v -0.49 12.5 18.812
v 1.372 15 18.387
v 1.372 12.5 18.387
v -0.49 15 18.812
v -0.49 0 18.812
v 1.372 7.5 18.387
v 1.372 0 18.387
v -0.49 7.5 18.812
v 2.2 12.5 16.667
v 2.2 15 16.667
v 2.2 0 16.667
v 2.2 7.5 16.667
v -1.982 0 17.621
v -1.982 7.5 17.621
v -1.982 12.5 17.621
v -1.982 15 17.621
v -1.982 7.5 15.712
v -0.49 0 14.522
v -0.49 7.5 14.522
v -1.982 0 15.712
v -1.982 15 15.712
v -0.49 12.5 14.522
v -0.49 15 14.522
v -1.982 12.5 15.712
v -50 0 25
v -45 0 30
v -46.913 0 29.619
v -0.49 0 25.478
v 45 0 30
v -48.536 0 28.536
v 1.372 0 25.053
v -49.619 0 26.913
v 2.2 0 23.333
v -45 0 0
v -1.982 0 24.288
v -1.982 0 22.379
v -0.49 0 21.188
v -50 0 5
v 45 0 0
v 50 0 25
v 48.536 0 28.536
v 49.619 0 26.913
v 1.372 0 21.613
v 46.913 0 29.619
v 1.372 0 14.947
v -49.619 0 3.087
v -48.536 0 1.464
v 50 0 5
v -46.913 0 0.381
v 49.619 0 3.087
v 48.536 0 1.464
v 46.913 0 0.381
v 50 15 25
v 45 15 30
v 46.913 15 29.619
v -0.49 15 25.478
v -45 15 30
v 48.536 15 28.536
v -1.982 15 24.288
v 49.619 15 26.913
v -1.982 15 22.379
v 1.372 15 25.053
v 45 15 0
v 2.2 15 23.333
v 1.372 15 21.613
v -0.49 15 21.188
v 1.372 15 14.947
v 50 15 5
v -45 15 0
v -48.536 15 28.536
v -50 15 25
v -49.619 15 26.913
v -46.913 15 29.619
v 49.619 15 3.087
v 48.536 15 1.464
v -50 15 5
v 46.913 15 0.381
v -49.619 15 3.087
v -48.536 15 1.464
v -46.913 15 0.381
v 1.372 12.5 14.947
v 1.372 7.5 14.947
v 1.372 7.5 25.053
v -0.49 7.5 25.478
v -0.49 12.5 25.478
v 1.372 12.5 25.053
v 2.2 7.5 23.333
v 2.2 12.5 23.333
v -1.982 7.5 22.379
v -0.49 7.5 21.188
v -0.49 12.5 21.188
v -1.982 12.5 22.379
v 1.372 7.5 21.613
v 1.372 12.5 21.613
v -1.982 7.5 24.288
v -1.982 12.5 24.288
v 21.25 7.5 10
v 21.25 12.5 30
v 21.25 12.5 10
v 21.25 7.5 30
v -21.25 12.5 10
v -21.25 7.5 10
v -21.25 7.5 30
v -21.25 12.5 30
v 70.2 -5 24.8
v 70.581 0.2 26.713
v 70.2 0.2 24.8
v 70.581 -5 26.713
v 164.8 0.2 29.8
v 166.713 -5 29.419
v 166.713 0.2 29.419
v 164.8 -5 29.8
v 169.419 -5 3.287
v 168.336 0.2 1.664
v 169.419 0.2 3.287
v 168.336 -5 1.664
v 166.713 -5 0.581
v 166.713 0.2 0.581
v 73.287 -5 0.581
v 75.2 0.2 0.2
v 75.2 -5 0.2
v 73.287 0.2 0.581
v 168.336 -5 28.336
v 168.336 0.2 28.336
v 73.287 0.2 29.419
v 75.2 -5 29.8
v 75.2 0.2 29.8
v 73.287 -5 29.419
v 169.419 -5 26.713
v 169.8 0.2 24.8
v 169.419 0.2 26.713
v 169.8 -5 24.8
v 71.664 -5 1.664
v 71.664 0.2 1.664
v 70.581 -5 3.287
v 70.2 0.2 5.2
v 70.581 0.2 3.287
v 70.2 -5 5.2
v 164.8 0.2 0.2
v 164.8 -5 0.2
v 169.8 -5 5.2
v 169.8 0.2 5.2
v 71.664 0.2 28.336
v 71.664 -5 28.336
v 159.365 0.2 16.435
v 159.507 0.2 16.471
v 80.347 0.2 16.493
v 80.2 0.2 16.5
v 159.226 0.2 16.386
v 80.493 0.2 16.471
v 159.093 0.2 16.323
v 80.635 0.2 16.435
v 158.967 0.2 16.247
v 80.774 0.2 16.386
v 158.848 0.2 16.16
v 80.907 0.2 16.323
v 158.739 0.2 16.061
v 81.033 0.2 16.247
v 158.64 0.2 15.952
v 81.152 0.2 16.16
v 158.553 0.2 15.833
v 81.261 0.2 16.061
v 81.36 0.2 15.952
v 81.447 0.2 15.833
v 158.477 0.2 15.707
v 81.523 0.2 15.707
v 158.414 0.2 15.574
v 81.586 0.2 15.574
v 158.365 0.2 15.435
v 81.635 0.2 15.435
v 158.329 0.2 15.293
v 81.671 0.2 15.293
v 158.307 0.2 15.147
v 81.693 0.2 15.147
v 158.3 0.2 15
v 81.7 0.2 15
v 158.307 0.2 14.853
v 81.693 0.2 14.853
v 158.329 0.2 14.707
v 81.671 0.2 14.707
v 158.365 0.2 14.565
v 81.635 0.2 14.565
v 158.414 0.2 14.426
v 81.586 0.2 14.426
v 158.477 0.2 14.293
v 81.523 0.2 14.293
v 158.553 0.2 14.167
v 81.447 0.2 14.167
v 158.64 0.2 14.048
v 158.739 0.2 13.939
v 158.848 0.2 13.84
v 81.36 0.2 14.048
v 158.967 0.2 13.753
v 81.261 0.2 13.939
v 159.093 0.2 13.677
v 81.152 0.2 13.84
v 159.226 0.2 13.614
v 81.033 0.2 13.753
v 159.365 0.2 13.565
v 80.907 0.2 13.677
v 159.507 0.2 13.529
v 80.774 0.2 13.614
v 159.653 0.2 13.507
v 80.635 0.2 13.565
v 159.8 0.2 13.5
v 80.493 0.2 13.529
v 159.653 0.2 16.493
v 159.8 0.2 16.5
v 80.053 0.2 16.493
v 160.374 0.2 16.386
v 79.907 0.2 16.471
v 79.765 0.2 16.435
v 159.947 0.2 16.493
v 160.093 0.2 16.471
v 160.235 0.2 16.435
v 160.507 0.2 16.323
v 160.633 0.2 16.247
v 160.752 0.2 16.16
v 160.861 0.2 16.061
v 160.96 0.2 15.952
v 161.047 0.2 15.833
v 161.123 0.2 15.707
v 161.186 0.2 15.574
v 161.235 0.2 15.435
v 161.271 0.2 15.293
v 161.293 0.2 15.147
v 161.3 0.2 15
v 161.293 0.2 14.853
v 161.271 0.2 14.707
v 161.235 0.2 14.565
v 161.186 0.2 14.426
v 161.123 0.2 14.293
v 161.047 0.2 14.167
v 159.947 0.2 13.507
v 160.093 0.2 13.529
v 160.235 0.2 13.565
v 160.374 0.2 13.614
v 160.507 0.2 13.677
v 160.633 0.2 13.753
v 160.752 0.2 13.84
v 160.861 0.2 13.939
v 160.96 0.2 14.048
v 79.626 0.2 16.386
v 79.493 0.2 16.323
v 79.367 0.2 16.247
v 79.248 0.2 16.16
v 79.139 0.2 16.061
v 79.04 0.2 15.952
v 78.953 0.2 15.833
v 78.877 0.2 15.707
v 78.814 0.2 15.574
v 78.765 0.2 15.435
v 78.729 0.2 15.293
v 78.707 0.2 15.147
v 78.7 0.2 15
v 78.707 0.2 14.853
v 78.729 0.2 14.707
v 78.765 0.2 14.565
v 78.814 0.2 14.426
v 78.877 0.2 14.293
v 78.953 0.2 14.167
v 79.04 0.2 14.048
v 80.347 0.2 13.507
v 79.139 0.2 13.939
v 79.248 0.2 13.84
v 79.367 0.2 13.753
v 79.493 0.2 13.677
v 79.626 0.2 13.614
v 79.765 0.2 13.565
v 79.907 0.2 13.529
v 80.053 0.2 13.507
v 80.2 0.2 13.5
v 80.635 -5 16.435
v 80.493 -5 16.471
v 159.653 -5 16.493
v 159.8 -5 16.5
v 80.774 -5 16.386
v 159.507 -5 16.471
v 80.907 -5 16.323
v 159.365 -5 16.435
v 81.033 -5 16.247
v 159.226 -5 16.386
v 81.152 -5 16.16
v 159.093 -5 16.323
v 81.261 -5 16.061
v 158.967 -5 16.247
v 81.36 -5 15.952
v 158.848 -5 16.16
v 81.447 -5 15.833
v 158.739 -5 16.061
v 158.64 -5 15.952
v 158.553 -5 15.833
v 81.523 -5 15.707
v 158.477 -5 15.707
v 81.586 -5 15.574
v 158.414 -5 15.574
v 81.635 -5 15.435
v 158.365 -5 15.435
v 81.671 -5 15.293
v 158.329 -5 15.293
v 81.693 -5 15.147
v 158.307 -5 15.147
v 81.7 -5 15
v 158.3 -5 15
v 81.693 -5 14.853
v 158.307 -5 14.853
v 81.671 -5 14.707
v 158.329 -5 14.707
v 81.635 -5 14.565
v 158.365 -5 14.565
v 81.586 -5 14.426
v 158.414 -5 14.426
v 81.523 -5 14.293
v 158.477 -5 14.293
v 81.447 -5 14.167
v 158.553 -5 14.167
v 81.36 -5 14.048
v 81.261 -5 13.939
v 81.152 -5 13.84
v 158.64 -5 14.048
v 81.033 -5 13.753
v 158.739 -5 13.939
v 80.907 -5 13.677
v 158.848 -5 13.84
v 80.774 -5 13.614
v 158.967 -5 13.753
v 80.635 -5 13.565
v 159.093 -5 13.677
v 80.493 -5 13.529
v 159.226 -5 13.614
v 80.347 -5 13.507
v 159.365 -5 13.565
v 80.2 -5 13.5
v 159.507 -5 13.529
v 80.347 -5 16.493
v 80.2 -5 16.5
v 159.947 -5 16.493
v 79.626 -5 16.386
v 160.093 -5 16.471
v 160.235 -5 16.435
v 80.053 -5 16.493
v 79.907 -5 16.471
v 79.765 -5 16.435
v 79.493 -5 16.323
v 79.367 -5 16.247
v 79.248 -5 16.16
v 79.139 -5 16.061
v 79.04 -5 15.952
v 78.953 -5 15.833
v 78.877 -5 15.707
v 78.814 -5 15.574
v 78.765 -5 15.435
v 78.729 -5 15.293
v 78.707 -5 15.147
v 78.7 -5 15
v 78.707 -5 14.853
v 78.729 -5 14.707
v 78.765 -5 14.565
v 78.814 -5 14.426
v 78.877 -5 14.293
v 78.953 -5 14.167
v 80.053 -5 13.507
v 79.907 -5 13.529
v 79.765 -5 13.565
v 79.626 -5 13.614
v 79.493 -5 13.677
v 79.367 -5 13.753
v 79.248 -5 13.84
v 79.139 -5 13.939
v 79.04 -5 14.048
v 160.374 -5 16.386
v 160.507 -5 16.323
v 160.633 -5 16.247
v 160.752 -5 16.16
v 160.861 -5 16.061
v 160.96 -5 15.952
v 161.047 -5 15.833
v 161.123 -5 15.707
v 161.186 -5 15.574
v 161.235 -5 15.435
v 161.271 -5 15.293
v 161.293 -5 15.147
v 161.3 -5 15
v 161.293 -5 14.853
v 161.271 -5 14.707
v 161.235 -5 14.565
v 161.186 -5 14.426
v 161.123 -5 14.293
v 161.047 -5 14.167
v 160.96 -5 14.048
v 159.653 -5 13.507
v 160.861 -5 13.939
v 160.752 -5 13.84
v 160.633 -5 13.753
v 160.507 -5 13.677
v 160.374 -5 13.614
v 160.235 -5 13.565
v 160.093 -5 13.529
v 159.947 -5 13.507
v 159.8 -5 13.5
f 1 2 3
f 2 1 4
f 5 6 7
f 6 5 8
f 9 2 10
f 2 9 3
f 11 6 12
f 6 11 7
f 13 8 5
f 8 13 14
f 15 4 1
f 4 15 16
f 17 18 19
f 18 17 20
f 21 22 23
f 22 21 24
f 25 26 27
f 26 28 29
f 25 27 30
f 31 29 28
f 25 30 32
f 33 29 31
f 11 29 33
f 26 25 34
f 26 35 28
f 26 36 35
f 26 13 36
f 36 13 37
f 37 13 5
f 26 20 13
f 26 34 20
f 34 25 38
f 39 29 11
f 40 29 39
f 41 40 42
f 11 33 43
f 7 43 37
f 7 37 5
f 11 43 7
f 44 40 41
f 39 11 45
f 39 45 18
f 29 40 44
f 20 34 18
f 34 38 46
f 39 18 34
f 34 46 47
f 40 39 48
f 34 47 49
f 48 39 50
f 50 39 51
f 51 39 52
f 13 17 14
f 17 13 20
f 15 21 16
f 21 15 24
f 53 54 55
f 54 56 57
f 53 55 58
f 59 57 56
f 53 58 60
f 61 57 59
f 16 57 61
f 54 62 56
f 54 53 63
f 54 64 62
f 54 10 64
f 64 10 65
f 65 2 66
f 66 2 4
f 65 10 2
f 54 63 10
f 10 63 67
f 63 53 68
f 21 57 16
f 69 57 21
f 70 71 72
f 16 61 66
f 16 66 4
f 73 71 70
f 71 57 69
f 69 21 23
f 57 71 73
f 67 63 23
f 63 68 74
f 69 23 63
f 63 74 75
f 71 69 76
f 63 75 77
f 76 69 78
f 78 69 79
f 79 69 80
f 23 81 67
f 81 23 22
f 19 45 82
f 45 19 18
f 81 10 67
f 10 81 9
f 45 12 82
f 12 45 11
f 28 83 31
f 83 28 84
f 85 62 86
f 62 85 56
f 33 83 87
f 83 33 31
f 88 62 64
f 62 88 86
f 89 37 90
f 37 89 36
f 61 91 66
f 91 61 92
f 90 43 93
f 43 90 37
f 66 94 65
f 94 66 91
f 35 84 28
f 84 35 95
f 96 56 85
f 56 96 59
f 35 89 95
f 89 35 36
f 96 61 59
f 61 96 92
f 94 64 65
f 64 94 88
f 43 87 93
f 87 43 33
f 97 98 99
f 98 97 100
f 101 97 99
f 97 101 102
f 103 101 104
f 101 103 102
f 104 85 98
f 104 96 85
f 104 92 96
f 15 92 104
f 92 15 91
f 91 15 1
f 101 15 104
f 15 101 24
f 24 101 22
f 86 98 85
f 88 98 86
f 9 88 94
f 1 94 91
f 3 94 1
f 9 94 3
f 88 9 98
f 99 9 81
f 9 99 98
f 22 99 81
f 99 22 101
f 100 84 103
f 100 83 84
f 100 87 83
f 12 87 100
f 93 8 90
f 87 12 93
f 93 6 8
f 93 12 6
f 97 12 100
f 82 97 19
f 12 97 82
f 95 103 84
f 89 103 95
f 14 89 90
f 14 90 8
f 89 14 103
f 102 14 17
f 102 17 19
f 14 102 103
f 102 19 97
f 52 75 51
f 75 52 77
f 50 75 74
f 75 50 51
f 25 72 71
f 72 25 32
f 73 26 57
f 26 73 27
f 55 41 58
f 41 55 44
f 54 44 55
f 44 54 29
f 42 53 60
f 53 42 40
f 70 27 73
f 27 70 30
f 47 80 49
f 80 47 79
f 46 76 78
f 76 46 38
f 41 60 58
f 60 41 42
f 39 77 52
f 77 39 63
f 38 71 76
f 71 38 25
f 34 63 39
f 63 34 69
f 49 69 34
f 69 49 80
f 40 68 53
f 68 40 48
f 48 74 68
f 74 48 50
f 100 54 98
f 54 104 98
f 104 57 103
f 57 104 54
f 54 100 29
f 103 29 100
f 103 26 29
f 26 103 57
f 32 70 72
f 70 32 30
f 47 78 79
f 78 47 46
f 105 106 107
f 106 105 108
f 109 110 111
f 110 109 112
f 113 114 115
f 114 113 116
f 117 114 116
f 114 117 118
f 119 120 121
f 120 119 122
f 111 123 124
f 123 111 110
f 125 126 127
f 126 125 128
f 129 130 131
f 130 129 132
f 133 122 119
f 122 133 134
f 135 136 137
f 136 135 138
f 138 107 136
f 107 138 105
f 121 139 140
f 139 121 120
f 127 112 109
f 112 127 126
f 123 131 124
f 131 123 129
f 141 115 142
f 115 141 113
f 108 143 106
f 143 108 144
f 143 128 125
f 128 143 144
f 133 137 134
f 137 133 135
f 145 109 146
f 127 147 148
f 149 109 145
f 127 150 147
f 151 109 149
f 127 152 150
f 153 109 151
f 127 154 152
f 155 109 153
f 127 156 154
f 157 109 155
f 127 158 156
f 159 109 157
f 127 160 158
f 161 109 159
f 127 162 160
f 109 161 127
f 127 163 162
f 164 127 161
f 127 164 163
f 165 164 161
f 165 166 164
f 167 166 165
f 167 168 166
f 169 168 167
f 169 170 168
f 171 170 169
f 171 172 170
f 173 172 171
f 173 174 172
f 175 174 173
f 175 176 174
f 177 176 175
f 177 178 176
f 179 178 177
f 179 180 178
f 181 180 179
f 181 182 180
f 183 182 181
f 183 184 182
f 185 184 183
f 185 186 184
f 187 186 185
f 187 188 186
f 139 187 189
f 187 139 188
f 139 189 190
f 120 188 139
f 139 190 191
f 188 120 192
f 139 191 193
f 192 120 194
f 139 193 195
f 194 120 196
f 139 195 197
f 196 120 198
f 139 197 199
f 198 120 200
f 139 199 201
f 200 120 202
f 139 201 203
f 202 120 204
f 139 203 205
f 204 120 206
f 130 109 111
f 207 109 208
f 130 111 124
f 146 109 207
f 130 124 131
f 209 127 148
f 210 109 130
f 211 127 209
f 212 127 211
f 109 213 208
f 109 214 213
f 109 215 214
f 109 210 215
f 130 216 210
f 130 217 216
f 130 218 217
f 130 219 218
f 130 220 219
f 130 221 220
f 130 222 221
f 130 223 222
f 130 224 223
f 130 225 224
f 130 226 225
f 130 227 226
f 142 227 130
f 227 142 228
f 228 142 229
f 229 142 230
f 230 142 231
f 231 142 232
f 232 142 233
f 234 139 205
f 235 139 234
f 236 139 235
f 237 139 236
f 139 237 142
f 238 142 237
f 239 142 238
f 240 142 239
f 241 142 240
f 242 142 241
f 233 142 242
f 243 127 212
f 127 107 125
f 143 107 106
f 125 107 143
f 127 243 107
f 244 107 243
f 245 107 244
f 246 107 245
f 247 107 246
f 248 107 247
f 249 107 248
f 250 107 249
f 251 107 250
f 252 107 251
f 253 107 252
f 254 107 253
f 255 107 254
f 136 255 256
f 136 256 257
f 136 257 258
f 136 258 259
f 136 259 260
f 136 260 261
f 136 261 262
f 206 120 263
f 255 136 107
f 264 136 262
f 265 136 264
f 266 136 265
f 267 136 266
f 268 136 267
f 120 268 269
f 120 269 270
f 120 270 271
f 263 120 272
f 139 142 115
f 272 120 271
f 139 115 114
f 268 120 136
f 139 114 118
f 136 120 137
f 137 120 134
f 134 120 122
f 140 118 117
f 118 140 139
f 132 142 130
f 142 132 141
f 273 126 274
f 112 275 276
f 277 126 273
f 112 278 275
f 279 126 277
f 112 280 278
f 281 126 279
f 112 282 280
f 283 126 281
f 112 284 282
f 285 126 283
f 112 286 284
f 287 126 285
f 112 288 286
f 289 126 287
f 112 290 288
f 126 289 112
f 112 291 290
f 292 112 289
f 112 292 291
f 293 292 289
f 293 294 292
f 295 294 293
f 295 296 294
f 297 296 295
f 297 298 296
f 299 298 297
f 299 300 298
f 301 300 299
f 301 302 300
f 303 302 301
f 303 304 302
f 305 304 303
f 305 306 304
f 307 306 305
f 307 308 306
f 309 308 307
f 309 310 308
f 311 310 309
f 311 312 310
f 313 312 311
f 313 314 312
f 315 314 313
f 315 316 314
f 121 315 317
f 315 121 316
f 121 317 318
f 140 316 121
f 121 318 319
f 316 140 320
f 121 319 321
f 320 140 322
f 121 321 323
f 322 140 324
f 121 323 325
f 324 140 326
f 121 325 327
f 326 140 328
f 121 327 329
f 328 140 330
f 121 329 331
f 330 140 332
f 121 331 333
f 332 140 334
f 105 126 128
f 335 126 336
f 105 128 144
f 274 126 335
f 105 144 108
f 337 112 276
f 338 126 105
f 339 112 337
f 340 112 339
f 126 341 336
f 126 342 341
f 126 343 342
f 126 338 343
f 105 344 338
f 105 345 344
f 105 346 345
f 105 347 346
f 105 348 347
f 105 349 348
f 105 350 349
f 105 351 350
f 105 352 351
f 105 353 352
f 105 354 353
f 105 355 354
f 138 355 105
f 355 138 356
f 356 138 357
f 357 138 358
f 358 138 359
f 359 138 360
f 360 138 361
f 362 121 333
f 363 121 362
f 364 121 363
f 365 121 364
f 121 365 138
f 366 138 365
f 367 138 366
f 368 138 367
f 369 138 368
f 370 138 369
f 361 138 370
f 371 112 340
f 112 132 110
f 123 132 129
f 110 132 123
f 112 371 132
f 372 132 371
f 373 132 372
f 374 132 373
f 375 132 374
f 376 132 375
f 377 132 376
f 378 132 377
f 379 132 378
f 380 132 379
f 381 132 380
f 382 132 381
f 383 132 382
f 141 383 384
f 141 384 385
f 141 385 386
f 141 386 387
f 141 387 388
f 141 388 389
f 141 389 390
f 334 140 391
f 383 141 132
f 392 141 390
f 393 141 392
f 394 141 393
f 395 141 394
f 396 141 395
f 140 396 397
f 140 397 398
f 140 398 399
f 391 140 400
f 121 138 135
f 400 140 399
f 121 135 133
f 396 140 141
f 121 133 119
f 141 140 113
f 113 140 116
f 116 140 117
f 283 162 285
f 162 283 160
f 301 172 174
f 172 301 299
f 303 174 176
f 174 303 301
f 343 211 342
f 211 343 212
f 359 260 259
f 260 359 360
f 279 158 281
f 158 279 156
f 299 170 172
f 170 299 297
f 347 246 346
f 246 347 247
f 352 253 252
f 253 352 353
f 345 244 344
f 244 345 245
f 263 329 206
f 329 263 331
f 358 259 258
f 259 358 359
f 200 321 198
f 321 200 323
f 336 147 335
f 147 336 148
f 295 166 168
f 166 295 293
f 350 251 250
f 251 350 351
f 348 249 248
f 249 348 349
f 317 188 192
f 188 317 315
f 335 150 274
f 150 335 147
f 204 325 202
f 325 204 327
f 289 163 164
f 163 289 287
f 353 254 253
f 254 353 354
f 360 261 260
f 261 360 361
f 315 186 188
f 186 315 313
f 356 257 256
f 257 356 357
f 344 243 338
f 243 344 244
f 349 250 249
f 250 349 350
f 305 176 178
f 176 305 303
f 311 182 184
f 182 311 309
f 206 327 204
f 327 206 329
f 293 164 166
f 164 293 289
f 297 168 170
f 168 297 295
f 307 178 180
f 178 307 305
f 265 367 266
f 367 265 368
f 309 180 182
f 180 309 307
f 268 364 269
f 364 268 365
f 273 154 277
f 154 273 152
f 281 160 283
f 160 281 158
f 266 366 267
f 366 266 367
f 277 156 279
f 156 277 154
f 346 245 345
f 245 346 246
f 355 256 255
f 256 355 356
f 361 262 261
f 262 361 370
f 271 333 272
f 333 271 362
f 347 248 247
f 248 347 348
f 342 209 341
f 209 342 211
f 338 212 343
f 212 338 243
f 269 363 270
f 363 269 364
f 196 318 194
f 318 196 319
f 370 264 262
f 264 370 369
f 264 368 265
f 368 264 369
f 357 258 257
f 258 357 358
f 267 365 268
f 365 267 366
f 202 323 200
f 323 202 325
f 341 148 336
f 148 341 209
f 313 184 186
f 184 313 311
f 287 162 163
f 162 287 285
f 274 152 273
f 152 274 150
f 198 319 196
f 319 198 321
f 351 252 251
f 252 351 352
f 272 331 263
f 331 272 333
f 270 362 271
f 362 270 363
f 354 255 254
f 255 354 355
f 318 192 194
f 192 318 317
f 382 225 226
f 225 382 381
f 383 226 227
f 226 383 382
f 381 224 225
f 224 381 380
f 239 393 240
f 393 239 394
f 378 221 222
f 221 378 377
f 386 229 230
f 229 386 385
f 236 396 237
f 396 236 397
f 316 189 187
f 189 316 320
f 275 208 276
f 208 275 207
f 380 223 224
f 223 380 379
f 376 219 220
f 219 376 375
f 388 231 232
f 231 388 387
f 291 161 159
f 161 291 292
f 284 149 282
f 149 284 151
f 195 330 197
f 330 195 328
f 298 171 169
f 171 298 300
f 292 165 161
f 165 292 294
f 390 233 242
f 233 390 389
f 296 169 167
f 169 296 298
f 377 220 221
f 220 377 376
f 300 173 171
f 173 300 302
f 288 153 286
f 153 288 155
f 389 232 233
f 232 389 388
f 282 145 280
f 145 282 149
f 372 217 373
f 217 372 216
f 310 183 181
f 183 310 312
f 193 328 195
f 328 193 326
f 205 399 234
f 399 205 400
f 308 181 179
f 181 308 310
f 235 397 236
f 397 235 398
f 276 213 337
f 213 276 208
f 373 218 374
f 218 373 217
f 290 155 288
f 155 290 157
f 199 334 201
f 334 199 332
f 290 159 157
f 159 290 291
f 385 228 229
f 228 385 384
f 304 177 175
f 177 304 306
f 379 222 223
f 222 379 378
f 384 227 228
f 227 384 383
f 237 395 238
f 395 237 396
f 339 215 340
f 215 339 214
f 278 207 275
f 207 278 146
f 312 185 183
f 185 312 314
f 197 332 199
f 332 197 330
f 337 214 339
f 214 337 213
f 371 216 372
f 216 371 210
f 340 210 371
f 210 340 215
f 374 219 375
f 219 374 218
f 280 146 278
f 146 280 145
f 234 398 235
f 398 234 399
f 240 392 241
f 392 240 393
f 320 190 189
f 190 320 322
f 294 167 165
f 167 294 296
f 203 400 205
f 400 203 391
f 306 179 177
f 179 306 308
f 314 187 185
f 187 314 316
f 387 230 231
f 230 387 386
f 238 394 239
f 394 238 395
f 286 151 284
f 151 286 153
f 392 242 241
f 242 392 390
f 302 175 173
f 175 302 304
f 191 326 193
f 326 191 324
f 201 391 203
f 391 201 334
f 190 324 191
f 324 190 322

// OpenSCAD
/* [ Wall Mount Plate ] */
// How many screw holes on wall mount plate
screw_holes = 2; // [0,2]

// How thick is the head of the screws (mm)
screw_thickness = 5; // [0:10]

// The diameter of the screw's long pointy part (mm)
screw_diameter = 2; // [0:10]

// Width of the wall mount plate (mm)
plate_width = 100; //[20:100]

// Height of the wall mount plate (mm)
plate_height = 30; // [10:100]

// Depth of the wall mount plate (mm)
plate_depth = 15; // [1:100]

// Offset of the plate corner curves
plate_offset = 5; // [0:20]

/* [ Dovetail ] */
// Vertical angle ongle of the dovetail mount (degrees, 0 = vertical)
dovetail_vertical_angle = 10; // [0:30]

// width of base of dovetail mount (mm, 0 = no base, should not be more than plate_height)
dovetail_base = 10; // [0:100]

// Width of the dovetail outside hole (mm)
dovetail_outer_width = 70; // [10:90]

// width of inner side of dovetail, against the back of the plate. Should be between plate width and outer width. (mm)
dovetail_inner_width = 85; // [10:99]

// Depth of the dovetail hole. Should be less than plate depth (mm)
dovetail_depth = 10; // [1:99]


/* [ Male Mount ] */

// Thickness of male mounting plate (mm)
male_plate_depth = 5; // [2:20]

// Width of male mounting plate (mm)
male_plate_width = 100; // [20:150]

// Height of male mounting plate (mm)
male_plate_height = 30; // [10:100]

// Number of screw holes
male_screw_holes = 2; // [0,2,4,6]

// Diameter of screw holes (mm)
male_screw_diameter = 3; // [1:10]

// Distance of screw holes from plate edges (mm)
male_screw_inset = 10; // [5:30]


/* [ Other ] */
// Clearance between the two dovetail pieces (mm)
clearence = 0.2; // [0:0.05:1]

// Display mode
display_mode = "Separated"; // [Together, Separated, Wall Mount, Male Mount]

/* [ Hidden ] */

module WallMount() {

    difference() {
        // Main Block
        translate([0,0,plate_height/2])
        rotate([0,90,90])
        linear_extrude(height=plate_depth)
        offset(r=plate_offset)
        offset(r=-plate_offset)
        square([plate_height,plate_width], center=true);
        
        // Dovetail
        DoveTail(clearence);
        
        if (screw_holes != 0) {
            // Screw Indent
            translate([0,dovetail_depth,plate_height/2 + dovetail_base,])
            cube([dovetail_inner_width/2, screw_thickness, plate_height], center=true);
            
            // Screw Holes
            for (i=[1:2]) {
                rotate([90,0,0])
                translate([
                0,
                dovetail_base + (((plate_height - dovetail_base)/3)*i),
                -plate_depth/2
                ])
                cylinder(h=plate_depth, r=screw_diameter + clearence, center = true);
                
            };
        };
        
    };
};

module DoveTail(clear) {
    
    points = [
    [dovetail_outer_width/2 + clear, 0, dovetail_base - clear], //FR 0
    [-dovetail_outer_width/2 - clear, 0, dovetail_base - clear], //FL 1
    [-dovetail_inner_width/2 - clear, dovetail_depth + clear, dovetail_base -clear], //BL2
    [dovetail_inner_width/2 + clear, dovetail_depth + clear, dovetail_base - clear], //BR3
    [dovetail_outer_width/2 + clear, 0, plate_height], //FRT 4
    [-dovetail_outer_width/2 - clear, 0, plate_height], //FLT 5
    [-dovetail_inner_width/2 - clear, dovetail_depth+clear, plate_height], //BLT6
    [dovetail_inner_width/2 + clear, dovetail_depth + clear, plate_height] //BRT7
    ];
    
    faces = [
    [0,1,2,3],
    [0,1,5,4],
    [1,2,6,5],
    [2,3,7,6],
    [0,3,7,4],
    [4,5,6,7]
    ];
    
    polyhedron(points, faces);
    
}

// Second half of the dovetail mount





module MaleMount() {

    difference() {

        union() {

            // Male dovetail
            DoveTail(-clearence);

            // Rounded backing plate
            // Clearance affects width and height,
            // but the plate stays connected to the dovetail
            translate([
                0,
                clearence,
                plate_height/2
            ])
            rotate([90,0,0])
            linear_extrude(
                height=male_plate_depth + clearence
            )
            offset(r=plate_offset)
            offset(r=-plate_offset)
            square([
                male_plate_width - 2*clearence,
                male_plate_height - 2*clearence
            ], center=true);
        }

        // Screw holes in backing plate
        if (male_screw_holes > 0) {

            for (i=[0:male_screw_holes-1]) {

                x_pos =
                    -(male_plate_width - 2*clearence)/2 +
                    male_screw_inset +
                    i * (
                        (male_plate_width -
                        2*clearence -
                        2*male_screw_inset) /
                        max(1,male_screw_holes-1)
                    );

                // Through holes
                translate([
                    x_pos,
                    -male_plate_depth/2,
                    plate_height/2
                ])
                rotate([90,0,0])
                cylinder(
                    h=male_plate_depth + 2*clearence + 2,
                    d=male_screw_diameter,
                    center=true,
                    $fn=64
                );
            }
        }
    }
}







/* [ Display ] */

if (display_mode == "Together") {

    color("LightGray")
    WallMount();

    color("Orange")
    MaleMount();

}
else if (display_mode == "Separated") {

    color("LightGray")
    WallMount();

    translate([plate_width + 20, 0, 0])
    color("Orange")
    MaleMount();

}
else if (display_mode == "Wall Mount") {

    WallMount();

}
else if (display_mode == "Male Mount") {

    MaleMount();

}
else {

    // Fallback to avoid empty geometry
    WallMount();

}
